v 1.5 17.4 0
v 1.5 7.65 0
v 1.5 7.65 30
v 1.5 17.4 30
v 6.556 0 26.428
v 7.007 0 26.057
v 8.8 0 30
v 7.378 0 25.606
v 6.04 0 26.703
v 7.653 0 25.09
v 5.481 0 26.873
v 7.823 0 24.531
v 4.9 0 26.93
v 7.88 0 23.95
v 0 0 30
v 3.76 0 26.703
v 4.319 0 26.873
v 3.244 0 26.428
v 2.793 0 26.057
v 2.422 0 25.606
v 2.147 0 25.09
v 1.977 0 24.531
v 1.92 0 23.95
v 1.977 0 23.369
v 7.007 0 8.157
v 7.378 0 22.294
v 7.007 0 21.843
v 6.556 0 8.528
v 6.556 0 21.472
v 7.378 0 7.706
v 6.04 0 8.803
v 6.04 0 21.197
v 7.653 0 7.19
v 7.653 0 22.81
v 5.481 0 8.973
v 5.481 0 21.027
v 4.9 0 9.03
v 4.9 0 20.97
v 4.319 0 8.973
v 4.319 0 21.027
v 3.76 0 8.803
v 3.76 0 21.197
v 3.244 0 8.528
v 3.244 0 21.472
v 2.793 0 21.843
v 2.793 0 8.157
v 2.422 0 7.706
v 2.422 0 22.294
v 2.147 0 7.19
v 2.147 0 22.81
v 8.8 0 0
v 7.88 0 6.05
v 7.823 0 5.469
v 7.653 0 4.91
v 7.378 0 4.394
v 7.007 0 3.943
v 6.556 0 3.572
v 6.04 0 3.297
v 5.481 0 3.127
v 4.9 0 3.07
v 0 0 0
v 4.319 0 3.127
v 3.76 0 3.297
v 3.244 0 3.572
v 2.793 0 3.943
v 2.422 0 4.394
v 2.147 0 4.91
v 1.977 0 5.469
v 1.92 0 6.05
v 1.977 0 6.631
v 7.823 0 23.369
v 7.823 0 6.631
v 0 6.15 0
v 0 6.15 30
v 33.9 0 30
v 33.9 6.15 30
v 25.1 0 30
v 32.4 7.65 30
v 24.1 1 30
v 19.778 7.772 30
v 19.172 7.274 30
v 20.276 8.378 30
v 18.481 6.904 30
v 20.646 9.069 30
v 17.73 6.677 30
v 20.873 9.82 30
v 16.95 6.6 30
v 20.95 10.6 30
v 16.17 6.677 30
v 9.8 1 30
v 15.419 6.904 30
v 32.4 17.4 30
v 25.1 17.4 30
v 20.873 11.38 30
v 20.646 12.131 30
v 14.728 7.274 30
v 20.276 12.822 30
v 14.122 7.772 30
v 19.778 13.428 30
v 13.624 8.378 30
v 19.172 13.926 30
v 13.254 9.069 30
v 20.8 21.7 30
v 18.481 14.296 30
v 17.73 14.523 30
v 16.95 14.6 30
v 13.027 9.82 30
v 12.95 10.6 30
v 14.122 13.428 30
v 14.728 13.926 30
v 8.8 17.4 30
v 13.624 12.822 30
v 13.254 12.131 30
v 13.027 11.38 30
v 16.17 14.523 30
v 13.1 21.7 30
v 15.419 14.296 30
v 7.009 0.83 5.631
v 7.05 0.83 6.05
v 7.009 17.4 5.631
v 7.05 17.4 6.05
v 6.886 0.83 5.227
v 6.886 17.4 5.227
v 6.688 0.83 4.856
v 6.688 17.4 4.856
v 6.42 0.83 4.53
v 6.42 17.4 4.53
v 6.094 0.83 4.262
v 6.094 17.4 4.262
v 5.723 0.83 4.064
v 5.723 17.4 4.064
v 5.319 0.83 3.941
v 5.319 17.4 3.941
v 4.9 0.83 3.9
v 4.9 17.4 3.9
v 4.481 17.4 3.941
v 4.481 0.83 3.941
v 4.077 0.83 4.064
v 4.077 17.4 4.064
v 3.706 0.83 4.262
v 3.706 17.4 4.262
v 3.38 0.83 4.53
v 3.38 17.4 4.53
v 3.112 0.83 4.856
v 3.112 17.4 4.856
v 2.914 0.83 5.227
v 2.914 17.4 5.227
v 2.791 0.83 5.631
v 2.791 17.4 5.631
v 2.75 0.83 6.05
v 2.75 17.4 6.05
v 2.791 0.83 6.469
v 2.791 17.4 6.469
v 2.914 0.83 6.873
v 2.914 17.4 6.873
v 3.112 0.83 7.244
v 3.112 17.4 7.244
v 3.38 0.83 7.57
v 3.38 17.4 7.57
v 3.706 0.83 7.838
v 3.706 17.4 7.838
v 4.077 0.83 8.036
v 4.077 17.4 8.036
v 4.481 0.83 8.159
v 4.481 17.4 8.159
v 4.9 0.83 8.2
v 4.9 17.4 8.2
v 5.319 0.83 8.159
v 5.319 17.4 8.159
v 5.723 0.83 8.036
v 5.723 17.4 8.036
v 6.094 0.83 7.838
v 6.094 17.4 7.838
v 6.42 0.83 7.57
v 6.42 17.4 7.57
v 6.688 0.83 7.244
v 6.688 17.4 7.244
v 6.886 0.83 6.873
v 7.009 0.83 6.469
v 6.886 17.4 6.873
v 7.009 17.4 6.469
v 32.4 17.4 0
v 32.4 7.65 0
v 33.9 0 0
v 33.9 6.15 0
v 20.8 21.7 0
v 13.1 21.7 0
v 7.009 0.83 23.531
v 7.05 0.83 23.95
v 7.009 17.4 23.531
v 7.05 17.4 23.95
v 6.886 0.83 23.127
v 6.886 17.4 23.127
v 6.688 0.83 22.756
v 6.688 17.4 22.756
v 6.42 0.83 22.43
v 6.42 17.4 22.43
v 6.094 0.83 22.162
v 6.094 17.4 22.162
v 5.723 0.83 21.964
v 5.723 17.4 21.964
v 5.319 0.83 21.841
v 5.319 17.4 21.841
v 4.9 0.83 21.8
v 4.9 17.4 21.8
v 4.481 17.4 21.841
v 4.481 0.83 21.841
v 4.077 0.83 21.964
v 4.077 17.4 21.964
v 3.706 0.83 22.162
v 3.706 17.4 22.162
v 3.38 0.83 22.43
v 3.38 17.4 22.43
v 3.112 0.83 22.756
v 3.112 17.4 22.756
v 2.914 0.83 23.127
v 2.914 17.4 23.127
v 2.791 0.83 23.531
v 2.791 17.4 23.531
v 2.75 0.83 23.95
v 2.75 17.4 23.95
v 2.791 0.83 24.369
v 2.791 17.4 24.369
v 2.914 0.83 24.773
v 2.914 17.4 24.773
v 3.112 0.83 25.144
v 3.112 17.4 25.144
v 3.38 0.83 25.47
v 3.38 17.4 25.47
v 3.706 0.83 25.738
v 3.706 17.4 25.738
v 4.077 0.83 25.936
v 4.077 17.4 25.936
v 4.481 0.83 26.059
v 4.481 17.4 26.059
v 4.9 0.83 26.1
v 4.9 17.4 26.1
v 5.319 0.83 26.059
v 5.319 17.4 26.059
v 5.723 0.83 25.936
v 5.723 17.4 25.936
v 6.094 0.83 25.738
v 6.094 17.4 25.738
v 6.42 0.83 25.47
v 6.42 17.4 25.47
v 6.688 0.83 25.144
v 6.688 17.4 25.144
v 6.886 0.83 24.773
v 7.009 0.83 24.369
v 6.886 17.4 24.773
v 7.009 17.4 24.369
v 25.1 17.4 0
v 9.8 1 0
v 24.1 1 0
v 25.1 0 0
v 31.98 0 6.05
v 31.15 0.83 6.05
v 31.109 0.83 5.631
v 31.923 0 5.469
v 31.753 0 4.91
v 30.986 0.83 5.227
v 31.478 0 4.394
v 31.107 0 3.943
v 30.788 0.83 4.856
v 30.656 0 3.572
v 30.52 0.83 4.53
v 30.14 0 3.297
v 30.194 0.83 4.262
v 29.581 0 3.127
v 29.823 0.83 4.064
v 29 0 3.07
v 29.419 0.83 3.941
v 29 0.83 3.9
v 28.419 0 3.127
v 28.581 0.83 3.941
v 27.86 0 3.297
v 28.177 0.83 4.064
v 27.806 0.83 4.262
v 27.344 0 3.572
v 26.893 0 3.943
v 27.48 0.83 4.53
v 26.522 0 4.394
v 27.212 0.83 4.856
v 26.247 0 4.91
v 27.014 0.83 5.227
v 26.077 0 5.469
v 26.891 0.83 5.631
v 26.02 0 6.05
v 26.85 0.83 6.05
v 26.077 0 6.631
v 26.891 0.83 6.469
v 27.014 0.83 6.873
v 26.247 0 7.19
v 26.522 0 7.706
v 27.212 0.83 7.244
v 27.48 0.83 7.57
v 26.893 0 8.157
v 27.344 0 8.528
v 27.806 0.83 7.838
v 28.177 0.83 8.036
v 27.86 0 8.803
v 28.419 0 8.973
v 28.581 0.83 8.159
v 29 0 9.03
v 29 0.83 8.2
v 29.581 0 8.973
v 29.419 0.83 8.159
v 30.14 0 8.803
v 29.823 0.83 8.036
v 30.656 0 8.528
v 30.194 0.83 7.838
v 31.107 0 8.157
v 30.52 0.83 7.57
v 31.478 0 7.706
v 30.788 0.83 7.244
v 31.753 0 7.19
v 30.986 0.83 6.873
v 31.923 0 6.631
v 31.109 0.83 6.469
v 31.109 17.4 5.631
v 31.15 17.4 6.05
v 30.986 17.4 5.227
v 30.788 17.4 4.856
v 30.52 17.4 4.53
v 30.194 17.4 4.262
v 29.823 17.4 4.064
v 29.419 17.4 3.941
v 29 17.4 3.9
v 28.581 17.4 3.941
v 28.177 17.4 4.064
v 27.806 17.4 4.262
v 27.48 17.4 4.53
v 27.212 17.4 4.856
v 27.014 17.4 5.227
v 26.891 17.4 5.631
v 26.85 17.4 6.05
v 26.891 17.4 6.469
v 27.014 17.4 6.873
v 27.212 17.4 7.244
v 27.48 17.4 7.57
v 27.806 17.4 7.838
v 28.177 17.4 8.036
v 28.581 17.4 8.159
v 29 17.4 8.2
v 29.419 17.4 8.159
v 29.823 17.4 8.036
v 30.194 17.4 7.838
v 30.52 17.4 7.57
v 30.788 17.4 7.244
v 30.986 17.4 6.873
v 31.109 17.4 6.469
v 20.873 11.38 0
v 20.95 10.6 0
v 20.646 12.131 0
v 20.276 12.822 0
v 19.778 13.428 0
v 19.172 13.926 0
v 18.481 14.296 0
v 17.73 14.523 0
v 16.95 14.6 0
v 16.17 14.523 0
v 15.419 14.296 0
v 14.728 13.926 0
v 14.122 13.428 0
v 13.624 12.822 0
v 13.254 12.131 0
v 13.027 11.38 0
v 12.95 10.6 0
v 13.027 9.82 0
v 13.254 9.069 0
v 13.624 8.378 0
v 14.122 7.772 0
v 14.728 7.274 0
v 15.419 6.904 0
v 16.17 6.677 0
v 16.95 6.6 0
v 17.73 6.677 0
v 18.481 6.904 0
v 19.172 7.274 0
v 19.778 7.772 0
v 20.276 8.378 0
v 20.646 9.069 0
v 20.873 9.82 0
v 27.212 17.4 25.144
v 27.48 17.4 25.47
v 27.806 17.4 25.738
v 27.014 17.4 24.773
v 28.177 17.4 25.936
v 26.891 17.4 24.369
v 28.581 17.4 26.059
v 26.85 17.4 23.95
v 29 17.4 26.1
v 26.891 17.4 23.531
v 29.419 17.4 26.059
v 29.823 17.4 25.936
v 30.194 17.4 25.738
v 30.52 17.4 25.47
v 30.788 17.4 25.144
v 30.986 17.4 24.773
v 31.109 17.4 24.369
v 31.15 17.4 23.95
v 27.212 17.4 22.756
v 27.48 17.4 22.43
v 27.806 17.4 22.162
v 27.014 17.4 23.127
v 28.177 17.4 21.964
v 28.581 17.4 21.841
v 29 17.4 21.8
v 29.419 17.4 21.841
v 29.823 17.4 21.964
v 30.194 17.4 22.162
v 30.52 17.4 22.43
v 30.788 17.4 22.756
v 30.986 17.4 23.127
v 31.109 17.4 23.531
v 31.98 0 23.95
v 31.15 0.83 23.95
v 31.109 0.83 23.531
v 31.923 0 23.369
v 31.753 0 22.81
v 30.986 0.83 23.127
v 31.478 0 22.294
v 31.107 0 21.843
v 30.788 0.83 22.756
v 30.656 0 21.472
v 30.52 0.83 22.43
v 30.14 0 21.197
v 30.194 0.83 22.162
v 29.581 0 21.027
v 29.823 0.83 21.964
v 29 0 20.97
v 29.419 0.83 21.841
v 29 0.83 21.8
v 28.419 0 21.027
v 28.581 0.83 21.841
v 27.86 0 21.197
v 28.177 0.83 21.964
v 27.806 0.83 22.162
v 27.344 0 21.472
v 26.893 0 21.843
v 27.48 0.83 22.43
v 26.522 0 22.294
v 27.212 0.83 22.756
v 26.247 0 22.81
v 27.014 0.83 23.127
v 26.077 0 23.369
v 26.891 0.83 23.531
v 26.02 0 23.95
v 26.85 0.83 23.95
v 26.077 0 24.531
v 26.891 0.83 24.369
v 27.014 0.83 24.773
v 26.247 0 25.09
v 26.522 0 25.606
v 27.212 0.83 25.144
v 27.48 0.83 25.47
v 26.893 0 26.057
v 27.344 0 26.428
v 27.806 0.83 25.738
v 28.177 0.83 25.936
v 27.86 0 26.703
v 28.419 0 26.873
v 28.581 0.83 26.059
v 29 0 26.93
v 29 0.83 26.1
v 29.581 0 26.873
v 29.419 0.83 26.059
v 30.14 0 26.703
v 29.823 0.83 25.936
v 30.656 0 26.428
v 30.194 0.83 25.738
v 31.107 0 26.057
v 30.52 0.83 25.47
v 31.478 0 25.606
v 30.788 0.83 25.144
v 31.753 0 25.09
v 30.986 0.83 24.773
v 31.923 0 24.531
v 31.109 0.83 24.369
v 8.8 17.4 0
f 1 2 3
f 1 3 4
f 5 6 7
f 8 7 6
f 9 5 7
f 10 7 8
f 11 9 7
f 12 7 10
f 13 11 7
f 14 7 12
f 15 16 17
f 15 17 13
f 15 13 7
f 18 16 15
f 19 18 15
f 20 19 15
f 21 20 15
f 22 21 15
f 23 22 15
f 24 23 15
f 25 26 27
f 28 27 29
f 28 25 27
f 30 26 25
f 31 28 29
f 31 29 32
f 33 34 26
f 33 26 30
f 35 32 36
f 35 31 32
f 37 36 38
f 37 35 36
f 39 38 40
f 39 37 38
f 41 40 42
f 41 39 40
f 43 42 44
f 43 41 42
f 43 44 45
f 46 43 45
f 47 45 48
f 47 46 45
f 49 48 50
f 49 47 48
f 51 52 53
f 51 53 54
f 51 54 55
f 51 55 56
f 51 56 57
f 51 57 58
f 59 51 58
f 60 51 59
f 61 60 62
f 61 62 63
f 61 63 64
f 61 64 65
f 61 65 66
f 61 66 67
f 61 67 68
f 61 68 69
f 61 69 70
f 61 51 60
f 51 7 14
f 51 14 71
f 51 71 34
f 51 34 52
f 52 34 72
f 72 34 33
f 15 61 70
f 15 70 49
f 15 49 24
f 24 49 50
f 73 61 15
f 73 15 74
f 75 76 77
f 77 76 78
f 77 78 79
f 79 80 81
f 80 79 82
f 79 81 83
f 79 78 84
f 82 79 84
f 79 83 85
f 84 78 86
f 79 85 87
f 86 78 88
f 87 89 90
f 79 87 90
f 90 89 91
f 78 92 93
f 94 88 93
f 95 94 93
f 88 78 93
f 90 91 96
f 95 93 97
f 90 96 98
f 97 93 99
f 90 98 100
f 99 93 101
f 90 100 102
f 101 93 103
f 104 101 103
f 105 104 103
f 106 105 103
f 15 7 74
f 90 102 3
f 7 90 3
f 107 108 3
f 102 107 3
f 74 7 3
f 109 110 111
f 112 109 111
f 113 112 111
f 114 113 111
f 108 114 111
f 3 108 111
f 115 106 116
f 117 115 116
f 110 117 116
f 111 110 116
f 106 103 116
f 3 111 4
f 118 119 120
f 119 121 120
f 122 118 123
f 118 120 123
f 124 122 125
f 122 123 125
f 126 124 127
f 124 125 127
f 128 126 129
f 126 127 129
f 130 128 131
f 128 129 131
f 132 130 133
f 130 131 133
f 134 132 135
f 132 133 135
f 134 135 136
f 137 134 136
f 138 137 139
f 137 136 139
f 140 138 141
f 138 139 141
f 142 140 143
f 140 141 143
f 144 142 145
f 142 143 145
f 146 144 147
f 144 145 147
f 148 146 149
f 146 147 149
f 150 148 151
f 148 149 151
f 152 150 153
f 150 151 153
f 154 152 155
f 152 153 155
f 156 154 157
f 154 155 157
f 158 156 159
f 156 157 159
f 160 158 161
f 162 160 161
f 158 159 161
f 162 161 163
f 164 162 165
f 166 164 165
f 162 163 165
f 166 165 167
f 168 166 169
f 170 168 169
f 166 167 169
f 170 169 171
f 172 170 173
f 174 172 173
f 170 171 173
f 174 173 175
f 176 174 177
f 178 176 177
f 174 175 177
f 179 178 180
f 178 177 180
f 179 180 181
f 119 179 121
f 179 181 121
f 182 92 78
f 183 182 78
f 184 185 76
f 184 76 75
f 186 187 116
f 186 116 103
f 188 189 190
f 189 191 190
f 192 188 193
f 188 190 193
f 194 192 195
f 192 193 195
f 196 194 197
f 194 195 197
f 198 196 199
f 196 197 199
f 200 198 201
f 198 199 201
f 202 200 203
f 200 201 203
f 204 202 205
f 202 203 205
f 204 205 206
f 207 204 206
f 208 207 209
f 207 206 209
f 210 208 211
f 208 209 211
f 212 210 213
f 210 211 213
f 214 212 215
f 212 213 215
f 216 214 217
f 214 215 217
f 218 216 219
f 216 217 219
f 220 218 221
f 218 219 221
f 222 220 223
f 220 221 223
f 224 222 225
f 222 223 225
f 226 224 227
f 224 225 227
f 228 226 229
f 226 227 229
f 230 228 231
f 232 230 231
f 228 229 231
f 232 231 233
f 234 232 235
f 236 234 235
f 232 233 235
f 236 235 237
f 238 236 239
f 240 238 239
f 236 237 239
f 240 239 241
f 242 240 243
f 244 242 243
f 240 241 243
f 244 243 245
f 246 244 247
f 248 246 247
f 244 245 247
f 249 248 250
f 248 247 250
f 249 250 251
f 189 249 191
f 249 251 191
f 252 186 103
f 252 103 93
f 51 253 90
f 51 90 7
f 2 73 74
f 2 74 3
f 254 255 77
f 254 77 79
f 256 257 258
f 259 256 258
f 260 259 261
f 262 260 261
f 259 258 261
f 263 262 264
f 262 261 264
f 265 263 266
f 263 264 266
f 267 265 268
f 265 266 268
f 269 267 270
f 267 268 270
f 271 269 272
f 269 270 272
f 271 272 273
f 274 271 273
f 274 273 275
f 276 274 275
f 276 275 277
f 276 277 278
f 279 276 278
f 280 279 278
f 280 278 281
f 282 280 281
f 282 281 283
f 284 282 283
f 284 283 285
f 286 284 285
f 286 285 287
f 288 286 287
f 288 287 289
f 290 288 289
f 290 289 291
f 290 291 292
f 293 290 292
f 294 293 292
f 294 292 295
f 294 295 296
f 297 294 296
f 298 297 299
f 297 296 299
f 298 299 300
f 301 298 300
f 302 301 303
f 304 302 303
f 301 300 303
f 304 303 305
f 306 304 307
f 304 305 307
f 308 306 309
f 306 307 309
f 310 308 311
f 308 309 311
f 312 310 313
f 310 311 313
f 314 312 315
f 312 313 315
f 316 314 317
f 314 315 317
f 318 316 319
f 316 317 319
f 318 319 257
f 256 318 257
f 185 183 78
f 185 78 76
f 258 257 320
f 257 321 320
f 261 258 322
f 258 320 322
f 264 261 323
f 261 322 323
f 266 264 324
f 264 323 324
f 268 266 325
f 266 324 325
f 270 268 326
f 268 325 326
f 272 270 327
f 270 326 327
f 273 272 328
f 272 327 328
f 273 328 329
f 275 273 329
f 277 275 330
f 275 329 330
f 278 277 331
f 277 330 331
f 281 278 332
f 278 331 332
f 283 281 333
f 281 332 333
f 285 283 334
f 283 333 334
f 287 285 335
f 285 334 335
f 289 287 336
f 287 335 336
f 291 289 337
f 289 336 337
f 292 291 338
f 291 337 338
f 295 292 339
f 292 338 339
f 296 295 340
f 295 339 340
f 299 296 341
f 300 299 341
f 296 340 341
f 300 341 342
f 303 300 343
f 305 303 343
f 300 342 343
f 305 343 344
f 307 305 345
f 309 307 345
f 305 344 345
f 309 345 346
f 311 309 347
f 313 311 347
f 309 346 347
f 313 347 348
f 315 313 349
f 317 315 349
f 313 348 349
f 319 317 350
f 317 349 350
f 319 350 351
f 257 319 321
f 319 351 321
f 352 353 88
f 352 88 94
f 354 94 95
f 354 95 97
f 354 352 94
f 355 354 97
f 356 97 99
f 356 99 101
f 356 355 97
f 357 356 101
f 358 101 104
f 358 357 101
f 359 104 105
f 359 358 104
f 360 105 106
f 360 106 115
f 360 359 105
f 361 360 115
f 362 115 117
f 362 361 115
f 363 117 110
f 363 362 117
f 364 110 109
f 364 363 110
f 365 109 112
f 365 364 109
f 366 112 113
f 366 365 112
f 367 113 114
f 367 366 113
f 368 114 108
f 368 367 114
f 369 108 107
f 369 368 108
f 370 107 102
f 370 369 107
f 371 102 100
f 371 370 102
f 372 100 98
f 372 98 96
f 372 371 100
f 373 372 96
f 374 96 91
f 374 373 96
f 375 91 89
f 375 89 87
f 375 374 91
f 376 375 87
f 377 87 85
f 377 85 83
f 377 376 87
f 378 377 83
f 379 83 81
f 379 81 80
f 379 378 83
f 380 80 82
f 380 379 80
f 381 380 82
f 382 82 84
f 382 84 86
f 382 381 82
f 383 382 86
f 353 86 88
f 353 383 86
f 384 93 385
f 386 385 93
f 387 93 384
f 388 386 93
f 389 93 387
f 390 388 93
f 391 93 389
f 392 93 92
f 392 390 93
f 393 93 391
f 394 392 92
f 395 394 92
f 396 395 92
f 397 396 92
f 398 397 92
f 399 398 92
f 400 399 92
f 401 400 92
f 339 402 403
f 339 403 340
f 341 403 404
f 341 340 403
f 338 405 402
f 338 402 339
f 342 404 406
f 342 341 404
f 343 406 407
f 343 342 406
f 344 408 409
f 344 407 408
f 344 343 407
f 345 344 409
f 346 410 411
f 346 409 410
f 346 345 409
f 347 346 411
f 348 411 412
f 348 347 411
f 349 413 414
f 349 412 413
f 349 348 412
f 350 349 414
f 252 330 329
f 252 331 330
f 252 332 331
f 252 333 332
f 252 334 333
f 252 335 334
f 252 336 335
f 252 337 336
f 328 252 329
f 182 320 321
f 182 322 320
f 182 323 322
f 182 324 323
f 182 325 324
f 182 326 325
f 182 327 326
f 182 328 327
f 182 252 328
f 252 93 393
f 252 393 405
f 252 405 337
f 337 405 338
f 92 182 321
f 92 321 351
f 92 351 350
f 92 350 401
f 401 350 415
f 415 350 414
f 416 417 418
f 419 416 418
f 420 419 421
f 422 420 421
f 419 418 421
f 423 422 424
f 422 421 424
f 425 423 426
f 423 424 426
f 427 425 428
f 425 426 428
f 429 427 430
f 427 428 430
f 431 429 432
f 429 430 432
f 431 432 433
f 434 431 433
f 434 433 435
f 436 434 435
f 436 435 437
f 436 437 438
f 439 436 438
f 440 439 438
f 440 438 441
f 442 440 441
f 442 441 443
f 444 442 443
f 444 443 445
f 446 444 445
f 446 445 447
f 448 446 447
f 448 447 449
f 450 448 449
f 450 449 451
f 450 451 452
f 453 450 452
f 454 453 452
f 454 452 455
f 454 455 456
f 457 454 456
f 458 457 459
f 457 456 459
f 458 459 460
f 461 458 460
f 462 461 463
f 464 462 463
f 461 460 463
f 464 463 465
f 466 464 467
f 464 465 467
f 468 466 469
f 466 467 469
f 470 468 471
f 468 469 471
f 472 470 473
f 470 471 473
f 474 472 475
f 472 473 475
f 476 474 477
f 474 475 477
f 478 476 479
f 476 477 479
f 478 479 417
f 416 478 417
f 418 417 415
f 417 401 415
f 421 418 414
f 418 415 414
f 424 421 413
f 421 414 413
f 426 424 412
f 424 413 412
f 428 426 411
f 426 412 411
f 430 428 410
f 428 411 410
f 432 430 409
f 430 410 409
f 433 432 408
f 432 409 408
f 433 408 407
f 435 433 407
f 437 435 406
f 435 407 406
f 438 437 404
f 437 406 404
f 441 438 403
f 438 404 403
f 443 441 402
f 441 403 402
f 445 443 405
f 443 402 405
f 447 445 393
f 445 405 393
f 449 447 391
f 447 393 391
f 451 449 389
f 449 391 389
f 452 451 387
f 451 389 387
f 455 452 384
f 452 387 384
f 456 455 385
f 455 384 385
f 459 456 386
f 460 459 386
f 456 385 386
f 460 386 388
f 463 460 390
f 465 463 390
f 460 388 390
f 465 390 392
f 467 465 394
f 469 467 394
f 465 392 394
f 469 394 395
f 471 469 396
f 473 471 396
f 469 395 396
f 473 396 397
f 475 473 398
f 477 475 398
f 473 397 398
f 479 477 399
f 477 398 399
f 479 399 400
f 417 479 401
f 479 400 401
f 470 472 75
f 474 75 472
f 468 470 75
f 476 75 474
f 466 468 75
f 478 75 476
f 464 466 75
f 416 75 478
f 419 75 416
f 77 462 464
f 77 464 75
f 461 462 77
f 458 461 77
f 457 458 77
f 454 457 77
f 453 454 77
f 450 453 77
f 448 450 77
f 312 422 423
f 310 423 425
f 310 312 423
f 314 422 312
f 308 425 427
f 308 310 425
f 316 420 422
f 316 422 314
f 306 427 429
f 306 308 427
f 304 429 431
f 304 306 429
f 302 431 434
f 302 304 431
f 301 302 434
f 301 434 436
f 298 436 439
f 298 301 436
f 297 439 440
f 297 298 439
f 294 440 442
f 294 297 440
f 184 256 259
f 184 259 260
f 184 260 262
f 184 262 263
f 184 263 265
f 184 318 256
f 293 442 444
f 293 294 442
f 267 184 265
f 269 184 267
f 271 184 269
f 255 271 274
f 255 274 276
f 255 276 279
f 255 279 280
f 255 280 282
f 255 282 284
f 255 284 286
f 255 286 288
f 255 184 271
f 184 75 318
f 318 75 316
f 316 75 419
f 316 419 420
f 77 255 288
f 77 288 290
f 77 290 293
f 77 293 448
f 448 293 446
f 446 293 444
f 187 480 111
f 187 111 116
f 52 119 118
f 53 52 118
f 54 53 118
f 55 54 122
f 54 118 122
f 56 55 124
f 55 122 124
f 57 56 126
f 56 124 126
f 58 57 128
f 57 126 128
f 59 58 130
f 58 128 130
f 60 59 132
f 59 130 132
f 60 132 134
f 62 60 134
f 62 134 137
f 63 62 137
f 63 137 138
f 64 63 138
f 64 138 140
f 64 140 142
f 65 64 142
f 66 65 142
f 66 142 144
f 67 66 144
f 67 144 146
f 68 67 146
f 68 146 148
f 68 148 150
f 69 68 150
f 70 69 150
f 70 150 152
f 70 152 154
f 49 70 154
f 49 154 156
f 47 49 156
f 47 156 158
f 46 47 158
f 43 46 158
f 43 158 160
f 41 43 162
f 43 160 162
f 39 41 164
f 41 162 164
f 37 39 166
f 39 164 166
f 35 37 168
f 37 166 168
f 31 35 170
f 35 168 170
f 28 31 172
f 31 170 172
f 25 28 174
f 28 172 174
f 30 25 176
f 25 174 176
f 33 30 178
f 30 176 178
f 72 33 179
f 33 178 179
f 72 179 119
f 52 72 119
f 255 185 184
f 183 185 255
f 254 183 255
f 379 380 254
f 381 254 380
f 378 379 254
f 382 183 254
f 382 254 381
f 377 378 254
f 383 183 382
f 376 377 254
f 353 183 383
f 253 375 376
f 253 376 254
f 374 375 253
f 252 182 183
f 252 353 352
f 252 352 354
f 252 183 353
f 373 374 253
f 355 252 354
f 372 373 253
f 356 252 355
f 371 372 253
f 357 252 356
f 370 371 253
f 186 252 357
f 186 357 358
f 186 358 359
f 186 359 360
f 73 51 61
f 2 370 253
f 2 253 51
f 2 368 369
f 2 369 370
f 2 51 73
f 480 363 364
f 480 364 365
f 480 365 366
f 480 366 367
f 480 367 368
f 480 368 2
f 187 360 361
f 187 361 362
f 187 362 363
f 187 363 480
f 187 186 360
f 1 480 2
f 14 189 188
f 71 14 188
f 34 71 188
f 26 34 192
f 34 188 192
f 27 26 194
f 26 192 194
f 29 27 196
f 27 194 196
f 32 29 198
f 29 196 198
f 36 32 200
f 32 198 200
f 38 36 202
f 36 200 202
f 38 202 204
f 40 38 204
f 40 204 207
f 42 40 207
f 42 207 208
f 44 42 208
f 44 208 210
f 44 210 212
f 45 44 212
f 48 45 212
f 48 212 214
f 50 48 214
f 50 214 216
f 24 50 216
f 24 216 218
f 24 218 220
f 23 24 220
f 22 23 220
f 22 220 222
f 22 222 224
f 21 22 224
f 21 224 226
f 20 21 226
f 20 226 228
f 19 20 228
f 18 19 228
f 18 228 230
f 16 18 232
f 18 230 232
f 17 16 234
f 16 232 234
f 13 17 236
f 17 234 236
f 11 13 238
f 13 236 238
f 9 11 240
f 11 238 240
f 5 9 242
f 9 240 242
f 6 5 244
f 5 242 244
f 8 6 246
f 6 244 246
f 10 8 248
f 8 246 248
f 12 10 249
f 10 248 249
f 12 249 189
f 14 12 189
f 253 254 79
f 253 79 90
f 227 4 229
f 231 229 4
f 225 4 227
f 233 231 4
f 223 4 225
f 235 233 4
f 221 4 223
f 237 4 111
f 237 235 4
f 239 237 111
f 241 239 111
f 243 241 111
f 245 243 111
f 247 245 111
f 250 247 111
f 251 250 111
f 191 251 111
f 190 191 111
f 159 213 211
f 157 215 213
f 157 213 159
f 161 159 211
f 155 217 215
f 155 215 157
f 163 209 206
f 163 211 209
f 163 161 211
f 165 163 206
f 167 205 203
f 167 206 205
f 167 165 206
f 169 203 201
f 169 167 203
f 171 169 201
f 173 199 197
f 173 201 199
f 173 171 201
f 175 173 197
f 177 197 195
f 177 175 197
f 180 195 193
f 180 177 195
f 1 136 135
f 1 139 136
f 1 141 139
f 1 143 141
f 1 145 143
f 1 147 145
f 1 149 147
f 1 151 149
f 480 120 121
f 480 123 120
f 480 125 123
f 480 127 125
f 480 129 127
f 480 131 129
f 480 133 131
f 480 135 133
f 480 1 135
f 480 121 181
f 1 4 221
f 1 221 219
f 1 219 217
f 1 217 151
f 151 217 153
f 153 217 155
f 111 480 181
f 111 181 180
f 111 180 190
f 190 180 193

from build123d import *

# Parameters (mm, degrees)
SKETCH1_R                                            = 4
BOSS_EXTRUDE1_DEPTH                                  = 30
CSK_FOR_M4_HEX_SOCKET_COUNTERSUNK_CAP_SC_D           = 4.3
CSK_FOR_M4_HEX_SOCKET_COUNTERSUNK_CAP_SC_CSINK_D     = 5.96
CSK_FOR_M4_HEX_SOCKET_COUNTERSUNK_CAP_SC_CSINK_ANGLE = 90


with BuildPart() as part:
    # Sketch1 → Boss-Extrude1 (new body)
    with BuildSketch(Plane.XY):
        Polygon((0, 0), (0, 6.15), (1.5, 7.65), (1.5, 17.4), (8.8, 17.4), (13.1, 21.7), (20.8, 21.7), (25.1, 17.4), (32.4, 17.4), (32.4, 7.65), (33.9, 6.15), (33.9, 0), (25.1, 0), (24.1, 1), (9.8, 1), (8.8, 0), align=None)
        with Locations((16.95, 10.6)):
            Circle(SKETCH1_R, mode=Mode.SUBTRACT)
    extrude(amount=BOSS_EXTRUDE1_DEPTH)

    # CSK for M4 Hex Socket Countersunk Cap Screw1 (through all)
    with Locations(Plane(origin=(0, 0, 0), x_dir=(-1, 0, 0), z_dir=(0, -1, 0))):
        with Locations((-4.9, -6.05), (-4.9, -23.95), (-29, -6.05), (-29, -23.95)):
            CounterSinkHole(CSK_FOR_M4_HEX_SOCKET_COUNTERSUNK_CAP_SC_D / 2, CSK_FOR_M4_HEX_SOCKET_COUNTERSUNK_CAP_SC_CSINK_D / 2, counter_sink_angle=CSK_FOR_M4_HEX_SOCKET_COUNTERSUNK_CAP_SC_CSINK_ANGLE)


solid = part.part
